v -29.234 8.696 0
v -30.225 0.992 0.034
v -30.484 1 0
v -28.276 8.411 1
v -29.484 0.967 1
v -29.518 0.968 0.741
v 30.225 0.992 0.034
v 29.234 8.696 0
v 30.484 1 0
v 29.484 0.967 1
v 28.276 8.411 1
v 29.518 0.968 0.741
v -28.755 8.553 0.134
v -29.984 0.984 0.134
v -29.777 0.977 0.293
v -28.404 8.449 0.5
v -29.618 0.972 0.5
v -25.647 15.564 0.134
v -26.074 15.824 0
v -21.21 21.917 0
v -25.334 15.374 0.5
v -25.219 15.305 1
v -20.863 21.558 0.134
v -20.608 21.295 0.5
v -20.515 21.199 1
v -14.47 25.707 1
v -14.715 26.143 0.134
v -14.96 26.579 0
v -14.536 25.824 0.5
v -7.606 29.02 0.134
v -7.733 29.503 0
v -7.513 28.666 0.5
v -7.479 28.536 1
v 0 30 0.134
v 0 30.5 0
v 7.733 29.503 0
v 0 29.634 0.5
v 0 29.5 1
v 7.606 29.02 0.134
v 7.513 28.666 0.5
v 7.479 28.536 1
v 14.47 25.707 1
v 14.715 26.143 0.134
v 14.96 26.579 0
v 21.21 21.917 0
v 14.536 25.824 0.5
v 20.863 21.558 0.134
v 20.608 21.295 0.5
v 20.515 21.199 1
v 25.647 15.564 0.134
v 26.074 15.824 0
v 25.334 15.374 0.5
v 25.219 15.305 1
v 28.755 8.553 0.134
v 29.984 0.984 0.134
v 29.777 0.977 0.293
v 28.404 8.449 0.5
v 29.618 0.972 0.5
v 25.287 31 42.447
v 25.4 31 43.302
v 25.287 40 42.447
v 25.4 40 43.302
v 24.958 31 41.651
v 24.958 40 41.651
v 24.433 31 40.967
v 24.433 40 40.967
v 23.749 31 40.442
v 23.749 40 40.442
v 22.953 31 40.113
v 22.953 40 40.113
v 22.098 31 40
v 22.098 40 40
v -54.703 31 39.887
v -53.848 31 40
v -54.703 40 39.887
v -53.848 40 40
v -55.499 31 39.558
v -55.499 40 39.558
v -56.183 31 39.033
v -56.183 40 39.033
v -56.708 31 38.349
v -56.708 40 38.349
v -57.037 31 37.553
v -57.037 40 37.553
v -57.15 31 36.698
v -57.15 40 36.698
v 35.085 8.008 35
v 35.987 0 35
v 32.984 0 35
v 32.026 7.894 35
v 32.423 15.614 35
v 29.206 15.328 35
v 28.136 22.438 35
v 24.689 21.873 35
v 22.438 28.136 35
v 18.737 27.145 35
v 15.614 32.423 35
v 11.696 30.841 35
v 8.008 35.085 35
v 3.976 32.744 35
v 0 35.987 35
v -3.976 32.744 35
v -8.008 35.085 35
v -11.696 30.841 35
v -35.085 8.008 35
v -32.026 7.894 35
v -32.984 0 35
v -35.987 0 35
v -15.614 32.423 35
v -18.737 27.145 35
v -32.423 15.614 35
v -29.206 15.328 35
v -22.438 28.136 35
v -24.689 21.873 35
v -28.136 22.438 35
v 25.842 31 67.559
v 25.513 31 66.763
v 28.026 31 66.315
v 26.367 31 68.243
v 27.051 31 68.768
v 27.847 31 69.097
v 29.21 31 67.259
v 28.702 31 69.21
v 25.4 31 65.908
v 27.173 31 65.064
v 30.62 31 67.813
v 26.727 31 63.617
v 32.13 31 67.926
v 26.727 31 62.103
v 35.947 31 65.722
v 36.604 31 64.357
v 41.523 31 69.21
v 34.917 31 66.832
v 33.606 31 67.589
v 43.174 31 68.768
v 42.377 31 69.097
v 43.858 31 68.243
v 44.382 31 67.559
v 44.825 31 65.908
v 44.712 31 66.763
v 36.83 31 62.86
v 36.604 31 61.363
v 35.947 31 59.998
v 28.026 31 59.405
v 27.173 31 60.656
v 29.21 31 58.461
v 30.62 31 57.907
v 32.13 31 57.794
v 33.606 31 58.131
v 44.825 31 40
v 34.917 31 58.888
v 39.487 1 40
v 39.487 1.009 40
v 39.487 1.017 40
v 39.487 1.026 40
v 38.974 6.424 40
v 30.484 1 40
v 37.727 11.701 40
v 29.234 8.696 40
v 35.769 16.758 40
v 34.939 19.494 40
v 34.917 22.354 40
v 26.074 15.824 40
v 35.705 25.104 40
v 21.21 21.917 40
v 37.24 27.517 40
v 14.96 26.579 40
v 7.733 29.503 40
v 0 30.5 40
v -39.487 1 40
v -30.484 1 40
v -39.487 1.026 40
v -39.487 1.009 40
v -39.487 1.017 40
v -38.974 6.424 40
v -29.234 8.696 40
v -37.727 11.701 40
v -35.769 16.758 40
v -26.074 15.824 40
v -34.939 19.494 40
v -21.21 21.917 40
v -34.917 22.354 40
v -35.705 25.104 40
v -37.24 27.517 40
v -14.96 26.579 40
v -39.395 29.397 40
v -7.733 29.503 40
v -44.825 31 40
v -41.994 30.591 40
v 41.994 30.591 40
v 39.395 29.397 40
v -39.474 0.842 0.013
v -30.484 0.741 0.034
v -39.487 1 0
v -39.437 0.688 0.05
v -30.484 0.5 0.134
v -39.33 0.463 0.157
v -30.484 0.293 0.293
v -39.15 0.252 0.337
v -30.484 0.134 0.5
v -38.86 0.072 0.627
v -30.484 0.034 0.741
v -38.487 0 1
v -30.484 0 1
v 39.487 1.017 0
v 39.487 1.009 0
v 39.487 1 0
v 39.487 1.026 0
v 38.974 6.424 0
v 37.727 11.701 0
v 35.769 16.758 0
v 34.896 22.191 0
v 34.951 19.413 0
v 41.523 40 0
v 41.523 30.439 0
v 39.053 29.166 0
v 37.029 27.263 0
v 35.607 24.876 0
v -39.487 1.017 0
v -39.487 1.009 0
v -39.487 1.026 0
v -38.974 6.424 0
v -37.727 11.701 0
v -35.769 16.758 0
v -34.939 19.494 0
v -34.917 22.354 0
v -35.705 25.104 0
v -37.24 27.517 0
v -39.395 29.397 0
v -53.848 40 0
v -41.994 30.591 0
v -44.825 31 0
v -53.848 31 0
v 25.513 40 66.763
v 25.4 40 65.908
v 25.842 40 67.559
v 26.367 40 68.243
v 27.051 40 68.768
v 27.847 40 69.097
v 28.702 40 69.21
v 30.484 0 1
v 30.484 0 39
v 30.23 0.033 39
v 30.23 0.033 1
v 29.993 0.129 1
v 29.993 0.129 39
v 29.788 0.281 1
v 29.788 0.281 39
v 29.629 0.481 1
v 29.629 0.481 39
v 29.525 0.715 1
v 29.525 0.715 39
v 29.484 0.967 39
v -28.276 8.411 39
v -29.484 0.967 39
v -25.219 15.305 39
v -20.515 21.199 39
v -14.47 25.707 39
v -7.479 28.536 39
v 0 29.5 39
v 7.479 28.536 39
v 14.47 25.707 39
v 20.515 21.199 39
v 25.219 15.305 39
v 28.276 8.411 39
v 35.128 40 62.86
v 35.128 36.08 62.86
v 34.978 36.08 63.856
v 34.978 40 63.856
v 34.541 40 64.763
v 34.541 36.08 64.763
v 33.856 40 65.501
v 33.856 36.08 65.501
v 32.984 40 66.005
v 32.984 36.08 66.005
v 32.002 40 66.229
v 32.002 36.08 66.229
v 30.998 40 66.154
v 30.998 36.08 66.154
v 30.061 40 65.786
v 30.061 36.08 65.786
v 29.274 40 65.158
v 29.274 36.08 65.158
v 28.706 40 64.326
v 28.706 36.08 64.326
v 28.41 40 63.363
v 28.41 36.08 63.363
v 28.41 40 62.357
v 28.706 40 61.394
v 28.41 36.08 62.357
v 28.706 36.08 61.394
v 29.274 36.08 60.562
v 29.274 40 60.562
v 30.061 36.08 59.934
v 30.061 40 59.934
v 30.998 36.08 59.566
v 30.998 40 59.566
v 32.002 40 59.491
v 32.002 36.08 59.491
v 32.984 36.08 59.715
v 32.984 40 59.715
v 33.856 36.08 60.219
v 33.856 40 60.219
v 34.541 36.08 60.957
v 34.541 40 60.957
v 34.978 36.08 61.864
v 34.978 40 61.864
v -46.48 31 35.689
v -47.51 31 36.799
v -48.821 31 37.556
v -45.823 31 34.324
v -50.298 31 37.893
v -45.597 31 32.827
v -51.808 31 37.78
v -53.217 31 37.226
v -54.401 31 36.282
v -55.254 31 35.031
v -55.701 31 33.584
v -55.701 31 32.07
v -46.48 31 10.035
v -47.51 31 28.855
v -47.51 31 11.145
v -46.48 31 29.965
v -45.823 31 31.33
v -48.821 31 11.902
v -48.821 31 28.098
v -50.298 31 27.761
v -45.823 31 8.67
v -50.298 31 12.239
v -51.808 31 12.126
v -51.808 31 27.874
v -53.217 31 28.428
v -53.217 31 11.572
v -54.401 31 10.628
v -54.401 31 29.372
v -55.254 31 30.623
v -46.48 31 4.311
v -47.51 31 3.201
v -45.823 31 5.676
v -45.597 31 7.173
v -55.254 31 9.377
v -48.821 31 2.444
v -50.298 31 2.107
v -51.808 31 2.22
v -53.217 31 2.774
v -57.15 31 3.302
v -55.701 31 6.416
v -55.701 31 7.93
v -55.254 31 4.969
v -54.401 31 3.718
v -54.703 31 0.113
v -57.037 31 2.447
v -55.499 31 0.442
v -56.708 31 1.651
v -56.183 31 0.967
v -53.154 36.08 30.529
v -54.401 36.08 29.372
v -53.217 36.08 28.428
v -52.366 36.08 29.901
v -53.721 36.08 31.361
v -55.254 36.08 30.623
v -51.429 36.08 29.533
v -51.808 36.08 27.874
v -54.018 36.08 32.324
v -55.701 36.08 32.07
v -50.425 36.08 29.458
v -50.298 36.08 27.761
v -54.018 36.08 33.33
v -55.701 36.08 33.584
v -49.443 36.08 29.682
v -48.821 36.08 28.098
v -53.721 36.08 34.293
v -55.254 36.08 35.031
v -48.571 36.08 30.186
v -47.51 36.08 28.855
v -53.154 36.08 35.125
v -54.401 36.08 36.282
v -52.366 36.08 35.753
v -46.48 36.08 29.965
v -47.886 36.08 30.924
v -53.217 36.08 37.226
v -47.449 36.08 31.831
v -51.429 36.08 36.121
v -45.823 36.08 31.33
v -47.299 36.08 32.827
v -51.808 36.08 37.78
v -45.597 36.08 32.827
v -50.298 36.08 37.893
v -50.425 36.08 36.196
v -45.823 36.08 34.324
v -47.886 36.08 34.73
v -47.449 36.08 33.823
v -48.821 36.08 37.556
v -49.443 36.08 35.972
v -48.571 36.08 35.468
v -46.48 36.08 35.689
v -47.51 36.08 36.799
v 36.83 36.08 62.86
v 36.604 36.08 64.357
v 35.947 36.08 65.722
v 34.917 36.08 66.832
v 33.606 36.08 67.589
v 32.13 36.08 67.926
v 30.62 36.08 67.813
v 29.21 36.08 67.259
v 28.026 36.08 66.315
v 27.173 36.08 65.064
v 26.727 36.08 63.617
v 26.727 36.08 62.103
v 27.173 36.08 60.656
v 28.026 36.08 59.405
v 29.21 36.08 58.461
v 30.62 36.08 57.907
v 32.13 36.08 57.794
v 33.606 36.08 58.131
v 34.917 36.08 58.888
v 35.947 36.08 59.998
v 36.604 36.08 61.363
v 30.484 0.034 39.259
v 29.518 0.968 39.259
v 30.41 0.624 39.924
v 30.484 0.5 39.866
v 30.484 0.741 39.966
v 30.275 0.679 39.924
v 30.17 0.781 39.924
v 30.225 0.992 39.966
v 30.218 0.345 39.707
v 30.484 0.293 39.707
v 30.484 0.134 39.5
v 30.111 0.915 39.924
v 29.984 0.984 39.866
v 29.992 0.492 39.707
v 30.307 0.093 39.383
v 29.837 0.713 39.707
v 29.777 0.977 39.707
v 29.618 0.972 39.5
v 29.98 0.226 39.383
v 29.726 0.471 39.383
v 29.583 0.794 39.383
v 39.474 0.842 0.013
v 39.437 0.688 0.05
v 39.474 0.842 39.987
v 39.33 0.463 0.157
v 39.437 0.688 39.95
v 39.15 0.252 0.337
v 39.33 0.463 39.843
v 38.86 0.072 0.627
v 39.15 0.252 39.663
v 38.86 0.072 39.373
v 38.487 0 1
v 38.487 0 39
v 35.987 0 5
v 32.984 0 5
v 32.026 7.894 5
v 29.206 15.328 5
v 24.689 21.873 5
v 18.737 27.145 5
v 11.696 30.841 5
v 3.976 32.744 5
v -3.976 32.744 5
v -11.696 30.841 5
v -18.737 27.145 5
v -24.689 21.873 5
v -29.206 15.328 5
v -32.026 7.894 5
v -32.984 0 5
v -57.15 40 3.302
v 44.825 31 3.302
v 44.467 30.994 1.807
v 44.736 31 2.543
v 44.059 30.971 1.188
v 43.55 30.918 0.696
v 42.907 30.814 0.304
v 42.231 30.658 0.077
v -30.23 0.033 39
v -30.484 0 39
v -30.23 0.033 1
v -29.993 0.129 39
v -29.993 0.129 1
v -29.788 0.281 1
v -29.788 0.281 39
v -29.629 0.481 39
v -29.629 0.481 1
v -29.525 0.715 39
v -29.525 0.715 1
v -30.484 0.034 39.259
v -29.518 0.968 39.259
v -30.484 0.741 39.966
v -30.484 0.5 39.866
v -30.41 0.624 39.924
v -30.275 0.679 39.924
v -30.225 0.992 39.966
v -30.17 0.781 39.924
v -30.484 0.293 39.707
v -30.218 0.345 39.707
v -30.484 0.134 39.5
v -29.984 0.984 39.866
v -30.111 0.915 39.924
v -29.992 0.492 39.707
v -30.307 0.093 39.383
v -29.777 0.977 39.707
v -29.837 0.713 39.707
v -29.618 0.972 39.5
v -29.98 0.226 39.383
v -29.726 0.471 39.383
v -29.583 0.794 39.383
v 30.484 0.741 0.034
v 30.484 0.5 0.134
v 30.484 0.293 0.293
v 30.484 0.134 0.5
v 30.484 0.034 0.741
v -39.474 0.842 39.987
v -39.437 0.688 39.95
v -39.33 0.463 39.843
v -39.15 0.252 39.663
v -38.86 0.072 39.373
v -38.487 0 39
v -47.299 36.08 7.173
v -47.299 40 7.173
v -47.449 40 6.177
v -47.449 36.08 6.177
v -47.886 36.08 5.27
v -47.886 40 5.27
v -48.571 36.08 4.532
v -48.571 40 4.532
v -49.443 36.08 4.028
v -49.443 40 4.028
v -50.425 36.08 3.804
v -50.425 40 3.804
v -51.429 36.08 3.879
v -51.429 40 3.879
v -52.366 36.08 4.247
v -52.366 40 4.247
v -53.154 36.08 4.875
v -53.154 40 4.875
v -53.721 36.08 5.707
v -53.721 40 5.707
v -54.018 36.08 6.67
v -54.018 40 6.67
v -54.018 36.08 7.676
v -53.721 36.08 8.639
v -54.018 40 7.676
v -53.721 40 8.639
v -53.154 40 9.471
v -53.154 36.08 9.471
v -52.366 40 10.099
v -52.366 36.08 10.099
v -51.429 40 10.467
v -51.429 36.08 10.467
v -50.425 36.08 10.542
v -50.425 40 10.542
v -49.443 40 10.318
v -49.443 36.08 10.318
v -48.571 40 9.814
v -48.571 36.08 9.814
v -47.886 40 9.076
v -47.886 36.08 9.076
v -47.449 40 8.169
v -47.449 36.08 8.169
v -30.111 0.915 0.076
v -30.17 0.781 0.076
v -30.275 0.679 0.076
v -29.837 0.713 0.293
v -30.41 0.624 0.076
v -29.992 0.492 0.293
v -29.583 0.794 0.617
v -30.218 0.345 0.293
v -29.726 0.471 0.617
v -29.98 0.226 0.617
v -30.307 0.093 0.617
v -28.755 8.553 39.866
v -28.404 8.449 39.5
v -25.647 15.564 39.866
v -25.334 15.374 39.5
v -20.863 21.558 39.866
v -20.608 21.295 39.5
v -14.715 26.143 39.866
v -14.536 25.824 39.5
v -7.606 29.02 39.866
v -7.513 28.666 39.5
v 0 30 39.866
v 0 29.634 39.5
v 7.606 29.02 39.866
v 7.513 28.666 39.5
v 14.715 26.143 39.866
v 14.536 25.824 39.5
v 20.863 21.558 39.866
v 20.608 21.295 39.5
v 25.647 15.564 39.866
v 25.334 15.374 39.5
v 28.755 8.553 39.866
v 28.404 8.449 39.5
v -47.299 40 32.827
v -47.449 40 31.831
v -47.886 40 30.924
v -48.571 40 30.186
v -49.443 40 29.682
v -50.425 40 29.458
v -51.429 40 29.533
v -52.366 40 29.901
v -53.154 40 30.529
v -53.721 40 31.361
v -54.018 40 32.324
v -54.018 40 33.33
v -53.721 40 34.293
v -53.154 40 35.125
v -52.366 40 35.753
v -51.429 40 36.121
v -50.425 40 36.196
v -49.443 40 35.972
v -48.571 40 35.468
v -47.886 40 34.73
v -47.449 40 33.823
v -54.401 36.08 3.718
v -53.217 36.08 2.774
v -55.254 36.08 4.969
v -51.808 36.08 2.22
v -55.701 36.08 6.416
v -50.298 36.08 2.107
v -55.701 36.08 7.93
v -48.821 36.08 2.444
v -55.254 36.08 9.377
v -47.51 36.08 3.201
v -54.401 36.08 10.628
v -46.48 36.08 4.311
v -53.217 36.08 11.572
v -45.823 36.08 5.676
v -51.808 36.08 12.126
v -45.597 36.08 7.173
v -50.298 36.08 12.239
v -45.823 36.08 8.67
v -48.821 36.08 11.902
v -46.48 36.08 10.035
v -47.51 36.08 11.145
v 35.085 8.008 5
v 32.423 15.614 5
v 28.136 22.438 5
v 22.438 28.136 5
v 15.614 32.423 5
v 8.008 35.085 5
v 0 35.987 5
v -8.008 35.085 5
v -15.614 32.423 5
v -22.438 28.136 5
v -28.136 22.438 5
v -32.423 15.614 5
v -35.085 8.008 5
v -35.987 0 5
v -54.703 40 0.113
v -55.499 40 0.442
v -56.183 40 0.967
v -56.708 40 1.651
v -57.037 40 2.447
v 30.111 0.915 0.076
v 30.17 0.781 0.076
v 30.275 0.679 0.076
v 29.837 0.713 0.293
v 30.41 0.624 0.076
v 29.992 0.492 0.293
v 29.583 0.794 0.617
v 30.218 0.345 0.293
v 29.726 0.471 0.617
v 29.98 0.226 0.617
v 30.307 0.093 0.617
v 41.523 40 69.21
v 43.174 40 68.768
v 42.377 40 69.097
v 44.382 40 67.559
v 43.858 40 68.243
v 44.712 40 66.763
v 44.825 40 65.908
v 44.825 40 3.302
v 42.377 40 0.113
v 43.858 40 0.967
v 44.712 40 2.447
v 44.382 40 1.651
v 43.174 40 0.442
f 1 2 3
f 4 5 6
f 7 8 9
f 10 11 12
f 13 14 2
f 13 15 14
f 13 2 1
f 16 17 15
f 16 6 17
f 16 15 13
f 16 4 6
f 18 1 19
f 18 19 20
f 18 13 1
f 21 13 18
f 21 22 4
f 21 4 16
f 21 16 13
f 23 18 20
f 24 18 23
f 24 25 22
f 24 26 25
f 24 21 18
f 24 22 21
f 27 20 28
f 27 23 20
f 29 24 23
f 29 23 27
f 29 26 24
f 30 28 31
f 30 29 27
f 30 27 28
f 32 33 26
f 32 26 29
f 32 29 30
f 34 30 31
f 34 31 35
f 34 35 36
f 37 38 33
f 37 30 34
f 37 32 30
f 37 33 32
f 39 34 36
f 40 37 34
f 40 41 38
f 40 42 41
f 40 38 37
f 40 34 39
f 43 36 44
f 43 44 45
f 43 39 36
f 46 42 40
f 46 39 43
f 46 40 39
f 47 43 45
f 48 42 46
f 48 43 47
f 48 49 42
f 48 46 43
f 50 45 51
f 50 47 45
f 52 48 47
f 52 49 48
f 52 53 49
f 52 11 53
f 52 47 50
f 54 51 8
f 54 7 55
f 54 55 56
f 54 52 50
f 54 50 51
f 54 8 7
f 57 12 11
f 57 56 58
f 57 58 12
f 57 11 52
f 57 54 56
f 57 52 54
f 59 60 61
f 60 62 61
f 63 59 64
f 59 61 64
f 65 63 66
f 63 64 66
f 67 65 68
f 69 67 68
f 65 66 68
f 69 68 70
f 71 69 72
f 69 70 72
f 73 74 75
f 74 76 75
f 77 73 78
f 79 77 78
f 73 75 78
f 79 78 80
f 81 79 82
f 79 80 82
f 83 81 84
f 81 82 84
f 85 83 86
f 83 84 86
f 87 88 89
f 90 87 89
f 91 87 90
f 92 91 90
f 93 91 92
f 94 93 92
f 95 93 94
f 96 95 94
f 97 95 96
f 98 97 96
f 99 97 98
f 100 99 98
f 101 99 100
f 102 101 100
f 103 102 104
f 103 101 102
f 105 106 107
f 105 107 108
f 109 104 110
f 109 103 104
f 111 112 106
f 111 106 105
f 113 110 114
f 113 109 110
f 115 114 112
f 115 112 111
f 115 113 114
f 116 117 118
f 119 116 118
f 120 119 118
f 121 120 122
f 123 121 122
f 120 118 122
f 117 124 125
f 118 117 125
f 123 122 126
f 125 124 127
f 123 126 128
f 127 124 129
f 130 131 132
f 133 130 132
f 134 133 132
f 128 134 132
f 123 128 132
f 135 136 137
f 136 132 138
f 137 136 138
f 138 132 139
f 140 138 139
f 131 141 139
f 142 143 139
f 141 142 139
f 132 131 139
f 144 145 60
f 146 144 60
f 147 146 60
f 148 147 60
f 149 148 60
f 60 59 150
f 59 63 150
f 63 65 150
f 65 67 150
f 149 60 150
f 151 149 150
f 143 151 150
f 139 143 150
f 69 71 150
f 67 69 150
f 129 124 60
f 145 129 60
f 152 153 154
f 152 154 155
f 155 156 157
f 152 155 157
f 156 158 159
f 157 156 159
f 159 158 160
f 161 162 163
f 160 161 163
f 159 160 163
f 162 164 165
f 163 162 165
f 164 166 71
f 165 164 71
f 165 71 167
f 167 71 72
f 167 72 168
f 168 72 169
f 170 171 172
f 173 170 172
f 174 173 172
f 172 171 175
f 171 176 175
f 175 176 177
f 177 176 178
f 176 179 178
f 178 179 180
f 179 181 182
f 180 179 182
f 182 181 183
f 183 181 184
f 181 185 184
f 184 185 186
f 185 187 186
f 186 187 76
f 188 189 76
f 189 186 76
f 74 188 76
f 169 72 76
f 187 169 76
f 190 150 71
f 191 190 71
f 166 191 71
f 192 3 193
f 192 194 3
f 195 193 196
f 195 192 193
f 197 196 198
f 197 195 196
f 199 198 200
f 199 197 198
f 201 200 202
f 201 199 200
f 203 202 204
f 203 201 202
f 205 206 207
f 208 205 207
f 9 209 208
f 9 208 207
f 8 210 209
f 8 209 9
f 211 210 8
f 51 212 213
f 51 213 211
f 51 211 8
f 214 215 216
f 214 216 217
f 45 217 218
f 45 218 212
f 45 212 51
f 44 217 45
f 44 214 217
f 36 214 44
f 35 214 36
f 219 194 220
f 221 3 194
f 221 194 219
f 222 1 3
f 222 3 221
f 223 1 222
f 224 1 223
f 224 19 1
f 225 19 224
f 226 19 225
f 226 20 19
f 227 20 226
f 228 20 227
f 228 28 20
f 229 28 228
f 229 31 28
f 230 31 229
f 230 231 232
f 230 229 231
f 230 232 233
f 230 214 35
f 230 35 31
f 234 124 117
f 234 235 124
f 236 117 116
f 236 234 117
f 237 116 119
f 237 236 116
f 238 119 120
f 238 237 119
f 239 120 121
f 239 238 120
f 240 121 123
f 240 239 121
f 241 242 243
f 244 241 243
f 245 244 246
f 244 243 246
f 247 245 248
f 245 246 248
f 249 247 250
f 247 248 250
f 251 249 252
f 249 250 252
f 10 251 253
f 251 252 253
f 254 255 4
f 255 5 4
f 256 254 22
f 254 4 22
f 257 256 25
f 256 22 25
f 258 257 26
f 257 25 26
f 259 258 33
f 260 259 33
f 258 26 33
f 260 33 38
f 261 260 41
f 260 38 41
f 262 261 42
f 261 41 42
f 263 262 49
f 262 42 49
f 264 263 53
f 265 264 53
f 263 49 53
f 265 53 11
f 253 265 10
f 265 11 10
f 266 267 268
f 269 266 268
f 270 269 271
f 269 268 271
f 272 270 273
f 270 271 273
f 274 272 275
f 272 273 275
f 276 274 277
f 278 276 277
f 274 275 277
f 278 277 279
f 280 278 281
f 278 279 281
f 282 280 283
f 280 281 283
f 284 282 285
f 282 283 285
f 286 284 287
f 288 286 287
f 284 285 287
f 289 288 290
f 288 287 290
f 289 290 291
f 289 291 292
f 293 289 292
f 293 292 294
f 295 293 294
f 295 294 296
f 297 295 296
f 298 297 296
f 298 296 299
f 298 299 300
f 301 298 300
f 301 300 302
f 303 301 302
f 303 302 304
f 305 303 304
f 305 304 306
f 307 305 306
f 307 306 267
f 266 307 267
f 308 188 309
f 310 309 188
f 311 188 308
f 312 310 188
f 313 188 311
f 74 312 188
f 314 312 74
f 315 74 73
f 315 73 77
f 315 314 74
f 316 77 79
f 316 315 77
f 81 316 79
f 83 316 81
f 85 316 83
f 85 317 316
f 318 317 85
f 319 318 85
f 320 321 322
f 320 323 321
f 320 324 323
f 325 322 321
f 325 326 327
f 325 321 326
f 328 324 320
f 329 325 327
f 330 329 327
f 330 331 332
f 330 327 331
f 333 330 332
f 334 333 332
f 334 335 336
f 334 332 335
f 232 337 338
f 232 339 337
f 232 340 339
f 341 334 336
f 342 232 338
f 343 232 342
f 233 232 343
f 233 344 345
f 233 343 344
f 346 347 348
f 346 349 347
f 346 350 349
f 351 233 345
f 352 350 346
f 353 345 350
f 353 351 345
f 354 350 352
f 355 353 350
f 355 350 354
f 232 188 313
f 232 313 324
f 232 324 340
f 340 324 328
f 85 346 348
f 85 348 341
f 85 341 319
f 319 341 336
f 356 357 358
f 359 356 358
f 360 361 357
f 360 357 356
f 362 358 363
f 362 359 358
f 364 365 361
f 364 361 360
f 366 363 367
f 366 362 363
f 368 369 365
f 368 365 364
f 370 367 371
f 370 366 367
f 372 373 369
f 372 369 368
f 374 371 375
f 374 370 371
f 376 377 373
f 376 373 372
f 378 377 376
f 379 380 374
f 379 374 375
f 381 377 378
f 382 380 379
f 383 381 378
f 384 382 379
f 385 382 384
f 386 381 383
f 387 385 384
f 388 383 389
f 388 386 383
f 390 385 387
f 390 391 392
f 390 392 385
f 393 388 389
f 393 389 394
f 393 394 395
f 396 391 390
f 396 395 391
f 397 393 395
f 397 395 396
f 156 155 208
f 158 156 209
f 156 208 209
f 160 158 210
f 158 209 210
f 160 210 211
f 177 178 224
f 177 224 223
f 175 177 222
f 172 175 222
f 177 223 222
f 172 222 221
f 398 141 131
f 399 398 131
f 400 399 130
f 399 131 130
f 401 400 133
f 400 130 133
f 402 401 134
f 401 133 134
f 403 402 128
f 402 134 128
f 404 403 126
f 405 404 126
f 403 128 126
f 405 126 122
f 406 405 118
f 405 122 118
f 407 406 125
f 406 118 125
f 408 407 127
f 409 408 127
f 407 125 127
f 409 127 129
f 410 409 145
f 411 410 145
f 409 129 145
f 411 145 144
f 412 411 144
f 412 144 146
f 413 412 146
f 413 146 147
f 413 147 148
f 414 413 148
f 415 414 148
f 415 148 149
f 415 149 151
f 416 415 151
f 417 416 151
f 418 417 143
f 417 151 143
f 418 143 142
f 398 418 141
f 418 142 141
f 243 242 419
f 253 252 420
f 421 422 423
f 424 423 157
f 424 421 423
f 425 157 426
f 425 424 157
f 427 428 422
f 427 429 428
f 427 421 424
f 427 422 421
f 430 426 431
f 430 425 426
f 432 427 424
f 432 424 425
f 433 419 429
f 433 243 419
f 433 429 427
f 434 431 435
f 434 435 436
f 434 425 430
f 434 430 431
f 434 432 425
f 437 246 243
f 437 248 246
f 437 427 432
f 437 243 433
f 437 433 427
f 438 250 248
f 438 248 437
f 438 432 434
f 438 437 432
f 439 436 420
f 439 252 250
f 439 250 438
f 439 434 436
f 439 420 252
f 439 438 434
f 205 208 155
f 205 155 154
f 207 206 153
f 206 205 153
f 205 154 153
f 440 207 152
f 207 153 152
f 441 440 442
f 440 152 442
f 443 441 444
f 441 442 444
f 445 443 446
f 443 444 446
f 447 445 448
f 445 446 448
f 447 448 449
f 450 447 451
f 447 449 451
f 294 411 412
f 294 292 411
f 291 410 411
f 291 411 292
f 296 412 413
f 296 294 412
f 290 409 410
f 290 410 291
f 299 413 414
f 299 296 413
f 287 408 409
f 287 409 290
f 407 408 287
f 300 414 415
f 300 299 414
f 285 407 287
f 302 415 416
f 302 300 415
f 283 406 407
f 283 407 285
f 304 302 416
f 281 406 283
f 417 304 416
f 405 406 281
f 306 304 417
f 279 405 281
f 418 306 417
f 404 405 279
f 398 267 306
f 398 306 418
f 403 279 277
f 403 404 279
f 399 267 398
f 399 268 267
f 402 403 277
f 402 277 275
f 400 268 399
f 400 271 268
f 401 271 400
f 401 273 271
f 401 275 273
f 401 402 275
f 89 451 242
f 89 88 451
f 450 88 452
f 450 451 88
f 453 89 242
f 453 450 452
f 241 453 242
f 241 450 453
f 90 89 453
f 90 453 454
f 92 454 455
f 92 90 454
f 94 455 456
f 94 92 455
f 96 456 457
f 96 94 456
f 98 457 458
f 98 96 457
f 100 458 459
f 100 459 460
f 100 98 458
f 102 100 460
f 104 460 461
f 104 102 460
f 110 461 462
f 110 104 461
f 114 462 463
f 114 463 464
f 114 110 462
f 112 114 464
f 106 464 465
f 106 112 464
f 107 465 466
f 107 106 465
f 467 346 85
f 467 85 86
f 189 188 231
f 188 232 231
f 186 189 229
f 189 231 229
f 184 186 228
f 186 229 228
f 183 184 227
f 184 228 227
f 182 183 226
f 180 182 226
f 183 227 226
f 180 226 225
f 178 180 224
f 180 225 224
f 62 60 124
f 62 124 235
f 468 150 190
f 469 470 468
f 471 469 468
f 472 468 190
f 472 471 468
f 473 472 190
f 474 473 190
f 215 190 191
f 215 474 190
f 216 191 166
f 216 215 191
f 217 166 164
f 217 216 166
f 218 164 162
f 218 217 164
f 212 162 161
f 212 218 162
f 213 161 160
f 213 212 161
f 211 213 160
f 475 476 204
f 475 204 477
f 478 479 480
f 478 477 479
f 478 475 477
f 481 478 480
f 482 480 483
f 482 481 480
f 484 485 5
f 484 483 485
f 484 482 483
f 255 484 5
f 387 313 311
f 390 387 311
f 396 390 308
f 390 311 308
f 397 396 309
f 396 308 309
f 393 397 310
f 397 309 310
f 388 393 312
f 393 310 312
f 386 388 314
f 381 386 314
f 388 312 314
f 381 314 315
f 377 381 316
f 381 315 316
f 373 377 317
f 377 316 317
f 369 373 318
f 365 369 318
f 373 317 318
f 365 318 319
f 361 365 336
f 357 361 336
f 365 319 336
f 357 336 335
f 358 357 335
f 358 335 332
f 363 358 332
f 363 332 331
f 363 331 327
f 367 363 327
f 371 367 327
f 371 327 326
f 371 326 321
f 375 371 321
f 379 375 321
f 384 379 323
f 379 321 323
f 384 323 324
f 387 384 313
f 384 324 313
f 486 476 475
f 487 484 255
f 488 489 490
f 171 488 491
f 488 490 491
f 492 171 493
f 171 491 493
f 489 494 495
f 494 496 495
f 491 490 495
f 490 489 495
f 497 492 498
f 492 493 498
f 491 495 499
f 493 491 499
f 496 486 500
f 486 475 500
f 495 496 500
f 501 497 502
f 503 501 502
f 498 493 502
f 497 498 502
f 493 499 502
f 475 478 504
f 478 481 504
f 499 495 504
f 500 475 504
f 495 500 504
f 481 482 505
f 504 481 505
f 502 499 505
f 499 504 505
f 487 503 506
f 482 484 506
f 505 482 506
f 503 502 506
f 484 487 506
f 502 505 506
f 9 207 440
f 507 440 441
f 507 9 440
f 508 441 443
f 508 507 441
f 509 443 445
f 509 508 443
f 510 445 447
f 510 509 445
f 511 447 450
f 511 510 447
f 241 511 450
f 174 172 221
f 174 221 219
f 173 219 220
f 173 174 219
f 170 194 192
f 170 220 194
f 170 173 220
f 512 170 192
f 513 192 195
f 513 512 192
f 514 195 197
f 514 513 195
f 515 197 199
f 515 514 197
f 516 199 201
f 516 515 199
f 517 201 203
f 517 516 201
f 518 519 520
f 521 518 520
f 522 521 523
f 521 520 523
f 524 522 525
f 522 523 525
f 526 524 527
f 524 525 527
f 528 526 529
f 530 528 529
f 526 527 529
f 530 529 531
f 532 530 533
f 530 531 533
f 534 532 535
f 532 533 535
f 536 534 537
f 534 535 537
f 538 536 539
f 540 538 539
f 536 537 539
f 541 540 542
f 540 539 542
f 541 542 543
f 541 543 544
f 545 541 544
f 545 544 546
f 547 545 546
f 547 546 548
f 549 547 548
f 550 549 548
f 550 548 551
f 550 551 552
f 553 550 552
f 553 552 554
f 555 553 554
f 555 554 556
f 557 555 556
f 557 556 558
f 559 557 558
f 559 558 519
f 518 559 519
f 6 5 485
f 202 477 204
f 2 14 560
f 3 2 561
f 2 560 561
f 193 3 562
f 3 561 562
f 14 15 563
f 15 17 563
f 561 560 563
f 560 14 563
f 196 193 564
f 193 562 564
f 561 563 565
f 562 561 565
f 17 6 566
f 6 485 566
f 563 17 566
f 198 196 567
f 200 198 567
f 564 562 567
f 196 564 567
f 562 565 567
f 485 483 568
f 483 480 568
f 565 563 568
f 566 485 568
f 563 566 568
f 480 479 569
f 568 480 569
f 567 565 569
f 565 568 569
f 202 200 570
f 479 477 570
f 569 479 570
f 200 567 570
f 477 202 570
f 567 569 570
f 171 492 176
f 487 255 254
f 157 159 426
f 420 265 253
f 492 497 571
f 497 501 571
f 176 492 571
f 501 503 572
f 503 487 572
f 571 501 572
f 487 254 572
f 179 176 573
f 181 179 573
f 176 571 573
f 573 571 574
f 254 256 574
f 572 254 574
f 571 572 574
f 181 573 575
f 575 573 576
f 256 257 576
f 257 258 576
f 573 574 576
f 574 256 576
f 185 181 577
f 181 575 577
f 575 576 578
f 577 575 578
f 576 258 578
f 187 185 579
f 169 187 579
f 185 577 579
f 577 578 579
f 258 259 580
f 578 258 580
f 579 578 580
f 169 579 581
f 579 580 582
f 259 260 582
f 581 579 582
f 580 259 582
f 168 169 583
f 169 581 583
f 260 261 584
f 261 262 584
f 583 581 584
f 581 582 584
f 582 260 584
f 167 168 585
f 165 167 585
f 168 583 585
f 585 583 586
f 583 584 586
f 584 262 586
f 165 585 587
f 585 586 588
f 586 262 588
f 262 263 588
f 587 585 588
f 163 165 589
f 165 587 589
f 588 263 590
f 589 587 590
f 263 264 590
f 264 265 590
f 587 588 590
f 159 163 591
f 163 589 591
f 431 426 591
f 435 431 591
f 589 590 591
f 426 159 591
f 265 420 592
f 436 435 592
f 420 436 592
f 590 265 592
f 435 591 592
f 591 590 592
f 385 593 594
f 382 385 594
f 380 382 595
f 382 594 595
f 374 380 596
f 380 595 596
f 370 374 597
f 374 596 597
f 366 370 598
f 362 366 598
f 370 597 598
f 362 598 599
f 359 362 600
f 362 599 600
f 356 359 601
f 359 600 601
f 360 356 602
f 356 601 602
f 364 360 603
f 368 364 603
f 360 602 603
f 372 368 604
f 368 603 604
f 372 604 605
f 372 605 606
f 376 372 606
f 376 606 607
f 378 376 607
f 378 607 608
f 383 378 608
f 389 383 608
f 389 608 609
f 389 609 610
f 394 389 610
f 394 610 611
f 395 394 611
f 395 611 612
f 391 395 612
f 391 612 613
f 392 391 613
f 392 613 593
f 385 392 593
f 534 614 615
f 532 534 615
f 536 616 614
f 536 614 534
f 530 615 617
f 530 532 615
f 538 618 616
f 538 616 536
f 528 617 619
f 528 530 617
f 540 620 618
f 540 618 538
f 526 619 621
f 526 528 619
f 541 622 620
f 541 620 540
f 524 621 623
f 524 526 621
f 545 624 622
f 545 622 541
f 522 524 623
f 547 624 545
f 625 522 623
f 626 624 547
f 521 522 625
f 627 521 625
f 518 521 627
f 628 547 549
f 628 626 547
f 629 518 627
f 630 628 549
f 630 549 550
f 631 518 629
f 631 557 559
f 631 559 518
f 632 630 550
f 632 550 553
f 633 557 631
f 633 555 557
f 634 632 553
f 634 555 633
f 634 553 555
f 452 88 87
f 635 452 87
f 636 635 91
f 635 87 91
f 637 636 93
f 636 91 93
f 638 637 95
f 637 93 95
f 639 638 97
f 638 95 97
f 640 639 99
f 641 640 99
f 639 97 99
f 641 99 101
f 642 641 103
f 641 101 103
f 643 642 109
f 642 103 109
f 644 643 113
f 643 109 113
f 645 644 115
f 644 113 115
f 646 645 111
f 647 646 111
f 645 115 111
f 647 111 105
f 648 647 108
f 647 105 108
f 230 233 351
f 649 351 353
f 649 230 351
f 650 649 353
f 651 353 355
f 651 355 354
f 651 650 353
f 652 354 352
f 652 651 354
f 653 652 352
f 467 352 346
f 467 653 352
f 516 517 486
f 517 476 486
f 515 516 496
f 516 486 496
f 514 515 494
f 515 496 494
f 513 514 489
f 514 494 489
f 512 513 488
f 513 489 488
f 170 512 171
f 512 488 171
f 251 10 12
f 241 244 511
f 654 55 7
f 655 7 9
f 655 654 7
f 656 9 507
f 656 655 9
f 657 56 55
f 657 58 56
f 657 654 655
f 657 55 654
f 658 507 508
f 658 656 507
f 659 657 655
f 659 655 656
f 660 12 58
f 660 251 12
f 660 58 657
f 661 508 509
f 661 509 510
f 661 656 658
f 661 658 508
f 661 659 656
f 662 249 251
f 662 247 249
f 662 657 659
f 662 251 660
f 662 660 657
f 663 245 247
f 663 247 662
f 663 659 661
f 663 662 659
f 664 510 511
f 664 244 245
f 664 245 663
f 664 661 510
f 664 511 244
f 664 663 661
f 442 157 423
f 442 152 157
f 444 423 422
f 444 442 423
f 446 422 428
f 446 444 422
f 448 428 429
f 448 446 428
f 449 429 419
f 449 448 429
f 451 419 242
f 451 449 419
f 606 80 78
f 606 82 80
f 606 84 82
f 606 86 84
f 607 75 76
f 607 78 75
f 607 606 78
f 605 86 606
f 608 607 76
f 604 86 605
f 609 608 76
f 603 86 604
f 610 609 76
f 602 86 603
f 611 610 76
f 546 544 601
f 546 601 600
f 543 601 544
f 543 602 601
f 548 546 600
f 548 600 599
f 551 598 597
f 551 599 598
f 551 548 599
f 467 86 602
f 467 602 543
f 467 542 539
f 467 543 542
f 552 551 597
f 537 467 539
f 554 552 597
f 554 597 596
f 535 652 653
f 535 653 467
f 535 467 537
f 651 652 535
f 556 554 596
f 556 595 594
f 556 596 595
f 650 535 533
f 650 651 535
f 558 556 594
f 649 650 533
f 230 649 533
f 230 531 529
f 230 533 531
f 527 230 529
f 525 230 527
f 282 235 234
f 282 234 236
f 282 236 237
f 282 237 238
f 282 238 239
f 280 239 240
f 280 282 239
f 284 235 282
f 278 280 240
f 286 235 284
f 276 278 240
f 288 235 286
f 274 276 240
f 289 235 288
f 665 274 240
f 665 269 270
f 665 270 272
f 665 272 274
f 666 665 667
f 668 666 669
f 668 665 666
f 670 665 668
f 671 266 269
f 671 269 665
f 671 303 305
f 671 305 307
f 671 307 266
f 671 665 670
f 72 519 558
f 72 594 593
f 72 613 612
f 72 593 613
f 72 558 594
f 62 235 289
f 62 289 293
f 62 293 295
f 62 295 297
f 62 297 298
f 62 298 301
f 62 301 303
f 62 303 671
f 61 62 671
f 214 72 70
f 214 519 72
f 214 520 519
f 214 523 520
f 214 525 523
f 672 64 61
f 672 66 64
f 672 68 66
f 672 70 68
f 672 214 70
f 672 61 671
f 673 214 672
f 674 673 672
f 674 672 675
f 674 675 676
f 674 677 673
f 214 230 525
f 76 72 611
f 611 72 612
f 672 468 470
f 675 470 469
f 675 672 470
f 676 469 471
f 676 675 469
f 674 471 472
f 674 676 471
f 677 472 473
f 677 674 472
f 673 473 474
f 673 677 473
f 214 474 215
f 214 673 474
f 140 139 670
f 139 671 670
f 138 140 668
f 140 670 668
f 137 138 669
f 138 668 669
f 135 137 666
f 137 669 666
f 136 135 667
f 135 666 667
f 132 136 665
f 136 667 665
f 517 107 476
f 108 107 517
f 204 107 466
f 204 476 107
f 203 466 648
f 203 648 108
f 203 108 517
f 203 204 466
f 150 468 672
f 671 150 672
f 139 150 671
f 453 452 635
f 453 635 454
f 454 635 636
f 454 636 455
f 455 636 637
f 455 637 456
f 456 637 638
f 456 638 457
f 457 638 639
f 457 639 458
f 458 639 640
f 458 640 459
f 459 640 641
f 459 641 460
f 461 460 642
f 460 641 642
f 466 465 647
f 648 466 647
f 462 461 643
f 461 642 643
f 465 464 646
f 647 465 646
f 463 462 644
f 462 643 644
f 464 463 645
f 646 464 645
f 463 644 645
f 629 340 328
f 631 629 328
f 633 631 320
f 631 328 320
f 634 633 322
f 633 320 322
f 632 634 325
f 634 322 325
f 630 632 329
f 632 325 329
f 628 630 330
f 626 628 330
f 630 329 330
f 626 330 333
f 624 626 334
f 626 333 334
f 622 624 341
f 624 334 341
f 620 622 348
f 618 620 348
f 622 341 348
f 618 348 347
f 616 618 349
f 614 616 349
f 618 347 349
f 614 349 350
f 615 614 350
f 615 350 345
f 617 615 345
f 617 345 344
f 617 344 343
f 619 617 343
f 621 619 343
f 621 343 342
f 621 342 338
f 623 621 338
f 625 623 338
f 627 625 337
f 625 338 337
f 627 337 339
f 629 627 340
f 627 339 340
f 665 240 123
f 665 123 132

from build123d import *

# Parameters (mm, degrees)
SKETCH1_R           = 39.5
BOSS_EXTRUDE1_DEPTH = 40
CUT_EXTRUDE2_DEPTH  = 41
CUT_EXTRUDE3_DEPTH  = 41
FILLET2_R           = 1
SKETCH6_W           = 114.3
SKETCH6_H           = 9
BOSS_EXTRUDE2_DEPTH = 40
FILLET6_R           = 10
CUT_EXTRUDE4_REACH  = 42
SKETCH9_R           = 3.3782
SKETCH11_W          = 31.75
SKETCH11_H          = 9
BOSS_EXTRUDE3_DEPTH = 29.21
SKETCH4_W           = 3.002871012
SKETCH4_H           = 30
FILLET7_R           = 3.302
SKETCH13_R          = 5.08
CUT_EXTRUDE6_DEPTH  = 5.08
SKETCH15_R          = 3.3782
CUT_EXTRUDE8_DEPTH  = 10
SKETCH16_R          = 5.08
CUT_EXTRUDE9_DEPTH  = 5.08
SKETCH17_W          = 36.586278343
SKETCH17_H          = 70.835632368
CUT_EXTRUDE10_DEPTH = 10
FILLET8_R           = 3.302


with BuildPart() as part:
    # Sketch1 → Boss-Extrude1 (new body)
    with BuildSketch(Plane.XY):
        Circle(SKETCH1_R)
    extrude(amount=BOSS_EXTRUDE1_DEPTH)

    # Sketch2 → Cut-Extrude2 (cut, through all)
    with BuildSketch(Plane(origin=(0, 0, 0), x_dir=(-1, 0, 0), z_dir=(0, 0, -1))):
        with BuildLine():
            Line((-39.5, 0), (39.5, 0))
            ThreePointArc((39.5, 0), (0, -39.5), (-39.5, 0))
        make_face()
    extrude(amount=-CUT_EXTRUDE2_DEPTH, mode=Mode.SUBTRACT)

    # Sketch3 → Cut-Extrude3 (cut, through all)
    with BuildSketch(Plane(origin=(0, 0, 0), x_dir=(-1, 0, 0), z_dir=(0, 0, -1))):
        with BuildLine():
            Line((-29.5, 0), (29.5, 0))
            ThreePointArc((29.5, 0), (0, 29.5), (-29.5, 0))
        make_face()
    extrude(amount=-CUT_EXTRUDE3_DEPTH, mode=Mode.SUBTRACT)

    # Fillet2
    fillet2_edges = [part.edges().sort_by_distance(p)[0] for p in [
        (-34.5, 0, 0),
        (-34.5, 0, 40),
        (0, 29.5, 40),
        (29.5, 0, 20),
        (-29.5, 0, 20),
        (0, 29.5, 0),
        (-39.5, 0, 20),
        (34.5, 0, 0),
        (39.5, 0, 20),
        (34.5, 0, 40),
    ]]
    fillet(fillet2_edges, radius=FILLET2_R)

    # Sketch6 → Boss-Extrude2 (add)
    with BuildSketch(Plane(origin=(0, 0, 0), x_dir=(-1, 0, 0), z_dir=(0, 0, -1))):
        with Locations((0, 35.5)):
            Rectangle(SKETCH6_W, SKETCH6_H)
    extrude(amount=-BOSS_EXTRUDE2_DEPTH)

    # Fillet6
    fillet6_edges = [part.edges().sort_by_distance(p)[0] for p in [
        (-24.47958333, 31, 20),
        (24.47958333, 31, 20),
    ]]
    fillet(fillet6_edges, radius=FILLET6_R)

    # Sketch9 → Cut-Extrude4 (cut, up to next)
    with BuildSketch(Plane(origin=(0, 40, 0), x_dir=(1, 0, 0), z_dir=(0, 1, 0)), mode=Mode.PRIVATE) as cut_extrude4_sk1:
        with Locations((-50.677371465, -7.173)):
            Circle(SKETCH9_R)
    cut_extrude4_tool1 = extrude(cut_extrude4_sk1.sketch, amount=-CUT_EXTRUDE4_REACH, mode=Mode.PRIVATE) & part.part
    add(cut_extrude4_tool1.solids().sort_by_distance((-50.677371, 40, 7.173))[0], mode=Mode.SUBTRACT)
    # Sketch9 → Cut-Extrude4 (cut, up to next)
    with BuildSketch(Plane(origin=(0, 40, 0), x_dir=(1, 0, 0), z_dir=(0, 1, 0)), mode=Mode.PRIVATE) as cut_extrude4_sk2:
        with Locations((-50.677371465, -32.827)):
            Circle(SKETCH9_R)
    cut_extrude4_tool2 = extrude(cut_extrude4_sk2.sketch, amount=-CUT_EXTRUDE4_REACH, mode=Mode.PRIVATE) & part.part
    add(cut_extrude4_tool2.solids().sort_by_distance((-50.677371, 40, 32.827))[0], mode=Mode.SUBTRACT)

    # Sketch11 → Boss-Extrude3 (add)
    with BuildSketch(Plane.XY.offset(40)):
        with Locations((41.275, 35.5)):
            Rectangle(SKETCH11_W, SKETCH11_H)
    extrude(amount=BOSS_EXTRUDE3_DEPTH)

    # Sketch4 → Cut-Revolve1 (revolve, cut)
    with BuildSketch(Plane.XZ):
        with Locations((34.48557529, 20)):
            Rectangle(SKETCH4_W, SKETCH4_H)
    revolve(axis=Axis((0, 0, 0), (0, 0, 1)), mode=Mode.SUBTRACT)

    # Fillet7
    fillet7_edges = [part.edges().sort_by_distance(p)[0] for p in [
        (25.4, 35.5, 40),
        (25.4, 35.5, 69.21),
        (57.15, 35.5, 69.21),
        (-57.15, 35.5, 0),
        (57.15, 35.5, 0),
        (-57.15, 35.5, 40),
    ]]
    fillet(fillet7_edges, radius=FILLET7_R)

    # Sketch13 → Cut-Extrude6 (cut)
    with BuildSketch(Plane.XZ.offset(-31)):
        with Locations((-50.677371465, 32.827)):
            Circle(SKETCH13_R)
        with Locations((-50.677371465, 7.173)):
            Circle(SKETCH13_R)
    extrude(amount=-CUT_EXTRUDE6_DEPTH, mode=Mode.SUBTRACT)

    # Sketch15 → Cut-Extrude8 (cut, through all)
    with BuildSketch(Plane.XZ.offset(-31)):
        with Locations((31.75, 62.86)):
            Circle(SKETCH15_R)
    extrude(amount=-CUT_EXTRUDE8_DEPTH, mode=Mode.SUBTRACT)

    # Sketch16 → Cut-Extrude9 (cut)
    with BuildSketch(Plane.XZ.offset(-31)):
        with Locations((31.75, 62.86)):
            Circle(SKETCH16_R)
    extrude(amount=-CUT_EXTRUDE9_DEPTH, mode=Mode.SUBTRACT)

    # Sketch17 → Cut-Extrude10 (cut, through all)
    with BuildSketch(Plane.XZ.offset(-31)):
        with Locations((63.117797564, 35.417816184)):
            Rectangle(SKETCH17_W, SKETCH17_H)
    extrude(amount=-CUT_EXTRUDE10_DEPTH, mode=Mode.SUBTRACT)

    # Fillet8
    fillet8_edges = [part.edges().sort_by_distance(p)[0] for p in [
        (44.824658392, 35.5, 69.21),
        (44.824658392, 35.5, 0),
    ]]
    fillet(fillet8_edges, radius=FILLET8_R)


with BuildPart() as body_2:
    # Mirror8: mirrored copy
    add(part.part.mirror(Plane(origin=(-57.15, 40, 154.653783191), x_dir=(0, 0, 1), z_dir=(-1, 0, 0))))


solid = part.part
